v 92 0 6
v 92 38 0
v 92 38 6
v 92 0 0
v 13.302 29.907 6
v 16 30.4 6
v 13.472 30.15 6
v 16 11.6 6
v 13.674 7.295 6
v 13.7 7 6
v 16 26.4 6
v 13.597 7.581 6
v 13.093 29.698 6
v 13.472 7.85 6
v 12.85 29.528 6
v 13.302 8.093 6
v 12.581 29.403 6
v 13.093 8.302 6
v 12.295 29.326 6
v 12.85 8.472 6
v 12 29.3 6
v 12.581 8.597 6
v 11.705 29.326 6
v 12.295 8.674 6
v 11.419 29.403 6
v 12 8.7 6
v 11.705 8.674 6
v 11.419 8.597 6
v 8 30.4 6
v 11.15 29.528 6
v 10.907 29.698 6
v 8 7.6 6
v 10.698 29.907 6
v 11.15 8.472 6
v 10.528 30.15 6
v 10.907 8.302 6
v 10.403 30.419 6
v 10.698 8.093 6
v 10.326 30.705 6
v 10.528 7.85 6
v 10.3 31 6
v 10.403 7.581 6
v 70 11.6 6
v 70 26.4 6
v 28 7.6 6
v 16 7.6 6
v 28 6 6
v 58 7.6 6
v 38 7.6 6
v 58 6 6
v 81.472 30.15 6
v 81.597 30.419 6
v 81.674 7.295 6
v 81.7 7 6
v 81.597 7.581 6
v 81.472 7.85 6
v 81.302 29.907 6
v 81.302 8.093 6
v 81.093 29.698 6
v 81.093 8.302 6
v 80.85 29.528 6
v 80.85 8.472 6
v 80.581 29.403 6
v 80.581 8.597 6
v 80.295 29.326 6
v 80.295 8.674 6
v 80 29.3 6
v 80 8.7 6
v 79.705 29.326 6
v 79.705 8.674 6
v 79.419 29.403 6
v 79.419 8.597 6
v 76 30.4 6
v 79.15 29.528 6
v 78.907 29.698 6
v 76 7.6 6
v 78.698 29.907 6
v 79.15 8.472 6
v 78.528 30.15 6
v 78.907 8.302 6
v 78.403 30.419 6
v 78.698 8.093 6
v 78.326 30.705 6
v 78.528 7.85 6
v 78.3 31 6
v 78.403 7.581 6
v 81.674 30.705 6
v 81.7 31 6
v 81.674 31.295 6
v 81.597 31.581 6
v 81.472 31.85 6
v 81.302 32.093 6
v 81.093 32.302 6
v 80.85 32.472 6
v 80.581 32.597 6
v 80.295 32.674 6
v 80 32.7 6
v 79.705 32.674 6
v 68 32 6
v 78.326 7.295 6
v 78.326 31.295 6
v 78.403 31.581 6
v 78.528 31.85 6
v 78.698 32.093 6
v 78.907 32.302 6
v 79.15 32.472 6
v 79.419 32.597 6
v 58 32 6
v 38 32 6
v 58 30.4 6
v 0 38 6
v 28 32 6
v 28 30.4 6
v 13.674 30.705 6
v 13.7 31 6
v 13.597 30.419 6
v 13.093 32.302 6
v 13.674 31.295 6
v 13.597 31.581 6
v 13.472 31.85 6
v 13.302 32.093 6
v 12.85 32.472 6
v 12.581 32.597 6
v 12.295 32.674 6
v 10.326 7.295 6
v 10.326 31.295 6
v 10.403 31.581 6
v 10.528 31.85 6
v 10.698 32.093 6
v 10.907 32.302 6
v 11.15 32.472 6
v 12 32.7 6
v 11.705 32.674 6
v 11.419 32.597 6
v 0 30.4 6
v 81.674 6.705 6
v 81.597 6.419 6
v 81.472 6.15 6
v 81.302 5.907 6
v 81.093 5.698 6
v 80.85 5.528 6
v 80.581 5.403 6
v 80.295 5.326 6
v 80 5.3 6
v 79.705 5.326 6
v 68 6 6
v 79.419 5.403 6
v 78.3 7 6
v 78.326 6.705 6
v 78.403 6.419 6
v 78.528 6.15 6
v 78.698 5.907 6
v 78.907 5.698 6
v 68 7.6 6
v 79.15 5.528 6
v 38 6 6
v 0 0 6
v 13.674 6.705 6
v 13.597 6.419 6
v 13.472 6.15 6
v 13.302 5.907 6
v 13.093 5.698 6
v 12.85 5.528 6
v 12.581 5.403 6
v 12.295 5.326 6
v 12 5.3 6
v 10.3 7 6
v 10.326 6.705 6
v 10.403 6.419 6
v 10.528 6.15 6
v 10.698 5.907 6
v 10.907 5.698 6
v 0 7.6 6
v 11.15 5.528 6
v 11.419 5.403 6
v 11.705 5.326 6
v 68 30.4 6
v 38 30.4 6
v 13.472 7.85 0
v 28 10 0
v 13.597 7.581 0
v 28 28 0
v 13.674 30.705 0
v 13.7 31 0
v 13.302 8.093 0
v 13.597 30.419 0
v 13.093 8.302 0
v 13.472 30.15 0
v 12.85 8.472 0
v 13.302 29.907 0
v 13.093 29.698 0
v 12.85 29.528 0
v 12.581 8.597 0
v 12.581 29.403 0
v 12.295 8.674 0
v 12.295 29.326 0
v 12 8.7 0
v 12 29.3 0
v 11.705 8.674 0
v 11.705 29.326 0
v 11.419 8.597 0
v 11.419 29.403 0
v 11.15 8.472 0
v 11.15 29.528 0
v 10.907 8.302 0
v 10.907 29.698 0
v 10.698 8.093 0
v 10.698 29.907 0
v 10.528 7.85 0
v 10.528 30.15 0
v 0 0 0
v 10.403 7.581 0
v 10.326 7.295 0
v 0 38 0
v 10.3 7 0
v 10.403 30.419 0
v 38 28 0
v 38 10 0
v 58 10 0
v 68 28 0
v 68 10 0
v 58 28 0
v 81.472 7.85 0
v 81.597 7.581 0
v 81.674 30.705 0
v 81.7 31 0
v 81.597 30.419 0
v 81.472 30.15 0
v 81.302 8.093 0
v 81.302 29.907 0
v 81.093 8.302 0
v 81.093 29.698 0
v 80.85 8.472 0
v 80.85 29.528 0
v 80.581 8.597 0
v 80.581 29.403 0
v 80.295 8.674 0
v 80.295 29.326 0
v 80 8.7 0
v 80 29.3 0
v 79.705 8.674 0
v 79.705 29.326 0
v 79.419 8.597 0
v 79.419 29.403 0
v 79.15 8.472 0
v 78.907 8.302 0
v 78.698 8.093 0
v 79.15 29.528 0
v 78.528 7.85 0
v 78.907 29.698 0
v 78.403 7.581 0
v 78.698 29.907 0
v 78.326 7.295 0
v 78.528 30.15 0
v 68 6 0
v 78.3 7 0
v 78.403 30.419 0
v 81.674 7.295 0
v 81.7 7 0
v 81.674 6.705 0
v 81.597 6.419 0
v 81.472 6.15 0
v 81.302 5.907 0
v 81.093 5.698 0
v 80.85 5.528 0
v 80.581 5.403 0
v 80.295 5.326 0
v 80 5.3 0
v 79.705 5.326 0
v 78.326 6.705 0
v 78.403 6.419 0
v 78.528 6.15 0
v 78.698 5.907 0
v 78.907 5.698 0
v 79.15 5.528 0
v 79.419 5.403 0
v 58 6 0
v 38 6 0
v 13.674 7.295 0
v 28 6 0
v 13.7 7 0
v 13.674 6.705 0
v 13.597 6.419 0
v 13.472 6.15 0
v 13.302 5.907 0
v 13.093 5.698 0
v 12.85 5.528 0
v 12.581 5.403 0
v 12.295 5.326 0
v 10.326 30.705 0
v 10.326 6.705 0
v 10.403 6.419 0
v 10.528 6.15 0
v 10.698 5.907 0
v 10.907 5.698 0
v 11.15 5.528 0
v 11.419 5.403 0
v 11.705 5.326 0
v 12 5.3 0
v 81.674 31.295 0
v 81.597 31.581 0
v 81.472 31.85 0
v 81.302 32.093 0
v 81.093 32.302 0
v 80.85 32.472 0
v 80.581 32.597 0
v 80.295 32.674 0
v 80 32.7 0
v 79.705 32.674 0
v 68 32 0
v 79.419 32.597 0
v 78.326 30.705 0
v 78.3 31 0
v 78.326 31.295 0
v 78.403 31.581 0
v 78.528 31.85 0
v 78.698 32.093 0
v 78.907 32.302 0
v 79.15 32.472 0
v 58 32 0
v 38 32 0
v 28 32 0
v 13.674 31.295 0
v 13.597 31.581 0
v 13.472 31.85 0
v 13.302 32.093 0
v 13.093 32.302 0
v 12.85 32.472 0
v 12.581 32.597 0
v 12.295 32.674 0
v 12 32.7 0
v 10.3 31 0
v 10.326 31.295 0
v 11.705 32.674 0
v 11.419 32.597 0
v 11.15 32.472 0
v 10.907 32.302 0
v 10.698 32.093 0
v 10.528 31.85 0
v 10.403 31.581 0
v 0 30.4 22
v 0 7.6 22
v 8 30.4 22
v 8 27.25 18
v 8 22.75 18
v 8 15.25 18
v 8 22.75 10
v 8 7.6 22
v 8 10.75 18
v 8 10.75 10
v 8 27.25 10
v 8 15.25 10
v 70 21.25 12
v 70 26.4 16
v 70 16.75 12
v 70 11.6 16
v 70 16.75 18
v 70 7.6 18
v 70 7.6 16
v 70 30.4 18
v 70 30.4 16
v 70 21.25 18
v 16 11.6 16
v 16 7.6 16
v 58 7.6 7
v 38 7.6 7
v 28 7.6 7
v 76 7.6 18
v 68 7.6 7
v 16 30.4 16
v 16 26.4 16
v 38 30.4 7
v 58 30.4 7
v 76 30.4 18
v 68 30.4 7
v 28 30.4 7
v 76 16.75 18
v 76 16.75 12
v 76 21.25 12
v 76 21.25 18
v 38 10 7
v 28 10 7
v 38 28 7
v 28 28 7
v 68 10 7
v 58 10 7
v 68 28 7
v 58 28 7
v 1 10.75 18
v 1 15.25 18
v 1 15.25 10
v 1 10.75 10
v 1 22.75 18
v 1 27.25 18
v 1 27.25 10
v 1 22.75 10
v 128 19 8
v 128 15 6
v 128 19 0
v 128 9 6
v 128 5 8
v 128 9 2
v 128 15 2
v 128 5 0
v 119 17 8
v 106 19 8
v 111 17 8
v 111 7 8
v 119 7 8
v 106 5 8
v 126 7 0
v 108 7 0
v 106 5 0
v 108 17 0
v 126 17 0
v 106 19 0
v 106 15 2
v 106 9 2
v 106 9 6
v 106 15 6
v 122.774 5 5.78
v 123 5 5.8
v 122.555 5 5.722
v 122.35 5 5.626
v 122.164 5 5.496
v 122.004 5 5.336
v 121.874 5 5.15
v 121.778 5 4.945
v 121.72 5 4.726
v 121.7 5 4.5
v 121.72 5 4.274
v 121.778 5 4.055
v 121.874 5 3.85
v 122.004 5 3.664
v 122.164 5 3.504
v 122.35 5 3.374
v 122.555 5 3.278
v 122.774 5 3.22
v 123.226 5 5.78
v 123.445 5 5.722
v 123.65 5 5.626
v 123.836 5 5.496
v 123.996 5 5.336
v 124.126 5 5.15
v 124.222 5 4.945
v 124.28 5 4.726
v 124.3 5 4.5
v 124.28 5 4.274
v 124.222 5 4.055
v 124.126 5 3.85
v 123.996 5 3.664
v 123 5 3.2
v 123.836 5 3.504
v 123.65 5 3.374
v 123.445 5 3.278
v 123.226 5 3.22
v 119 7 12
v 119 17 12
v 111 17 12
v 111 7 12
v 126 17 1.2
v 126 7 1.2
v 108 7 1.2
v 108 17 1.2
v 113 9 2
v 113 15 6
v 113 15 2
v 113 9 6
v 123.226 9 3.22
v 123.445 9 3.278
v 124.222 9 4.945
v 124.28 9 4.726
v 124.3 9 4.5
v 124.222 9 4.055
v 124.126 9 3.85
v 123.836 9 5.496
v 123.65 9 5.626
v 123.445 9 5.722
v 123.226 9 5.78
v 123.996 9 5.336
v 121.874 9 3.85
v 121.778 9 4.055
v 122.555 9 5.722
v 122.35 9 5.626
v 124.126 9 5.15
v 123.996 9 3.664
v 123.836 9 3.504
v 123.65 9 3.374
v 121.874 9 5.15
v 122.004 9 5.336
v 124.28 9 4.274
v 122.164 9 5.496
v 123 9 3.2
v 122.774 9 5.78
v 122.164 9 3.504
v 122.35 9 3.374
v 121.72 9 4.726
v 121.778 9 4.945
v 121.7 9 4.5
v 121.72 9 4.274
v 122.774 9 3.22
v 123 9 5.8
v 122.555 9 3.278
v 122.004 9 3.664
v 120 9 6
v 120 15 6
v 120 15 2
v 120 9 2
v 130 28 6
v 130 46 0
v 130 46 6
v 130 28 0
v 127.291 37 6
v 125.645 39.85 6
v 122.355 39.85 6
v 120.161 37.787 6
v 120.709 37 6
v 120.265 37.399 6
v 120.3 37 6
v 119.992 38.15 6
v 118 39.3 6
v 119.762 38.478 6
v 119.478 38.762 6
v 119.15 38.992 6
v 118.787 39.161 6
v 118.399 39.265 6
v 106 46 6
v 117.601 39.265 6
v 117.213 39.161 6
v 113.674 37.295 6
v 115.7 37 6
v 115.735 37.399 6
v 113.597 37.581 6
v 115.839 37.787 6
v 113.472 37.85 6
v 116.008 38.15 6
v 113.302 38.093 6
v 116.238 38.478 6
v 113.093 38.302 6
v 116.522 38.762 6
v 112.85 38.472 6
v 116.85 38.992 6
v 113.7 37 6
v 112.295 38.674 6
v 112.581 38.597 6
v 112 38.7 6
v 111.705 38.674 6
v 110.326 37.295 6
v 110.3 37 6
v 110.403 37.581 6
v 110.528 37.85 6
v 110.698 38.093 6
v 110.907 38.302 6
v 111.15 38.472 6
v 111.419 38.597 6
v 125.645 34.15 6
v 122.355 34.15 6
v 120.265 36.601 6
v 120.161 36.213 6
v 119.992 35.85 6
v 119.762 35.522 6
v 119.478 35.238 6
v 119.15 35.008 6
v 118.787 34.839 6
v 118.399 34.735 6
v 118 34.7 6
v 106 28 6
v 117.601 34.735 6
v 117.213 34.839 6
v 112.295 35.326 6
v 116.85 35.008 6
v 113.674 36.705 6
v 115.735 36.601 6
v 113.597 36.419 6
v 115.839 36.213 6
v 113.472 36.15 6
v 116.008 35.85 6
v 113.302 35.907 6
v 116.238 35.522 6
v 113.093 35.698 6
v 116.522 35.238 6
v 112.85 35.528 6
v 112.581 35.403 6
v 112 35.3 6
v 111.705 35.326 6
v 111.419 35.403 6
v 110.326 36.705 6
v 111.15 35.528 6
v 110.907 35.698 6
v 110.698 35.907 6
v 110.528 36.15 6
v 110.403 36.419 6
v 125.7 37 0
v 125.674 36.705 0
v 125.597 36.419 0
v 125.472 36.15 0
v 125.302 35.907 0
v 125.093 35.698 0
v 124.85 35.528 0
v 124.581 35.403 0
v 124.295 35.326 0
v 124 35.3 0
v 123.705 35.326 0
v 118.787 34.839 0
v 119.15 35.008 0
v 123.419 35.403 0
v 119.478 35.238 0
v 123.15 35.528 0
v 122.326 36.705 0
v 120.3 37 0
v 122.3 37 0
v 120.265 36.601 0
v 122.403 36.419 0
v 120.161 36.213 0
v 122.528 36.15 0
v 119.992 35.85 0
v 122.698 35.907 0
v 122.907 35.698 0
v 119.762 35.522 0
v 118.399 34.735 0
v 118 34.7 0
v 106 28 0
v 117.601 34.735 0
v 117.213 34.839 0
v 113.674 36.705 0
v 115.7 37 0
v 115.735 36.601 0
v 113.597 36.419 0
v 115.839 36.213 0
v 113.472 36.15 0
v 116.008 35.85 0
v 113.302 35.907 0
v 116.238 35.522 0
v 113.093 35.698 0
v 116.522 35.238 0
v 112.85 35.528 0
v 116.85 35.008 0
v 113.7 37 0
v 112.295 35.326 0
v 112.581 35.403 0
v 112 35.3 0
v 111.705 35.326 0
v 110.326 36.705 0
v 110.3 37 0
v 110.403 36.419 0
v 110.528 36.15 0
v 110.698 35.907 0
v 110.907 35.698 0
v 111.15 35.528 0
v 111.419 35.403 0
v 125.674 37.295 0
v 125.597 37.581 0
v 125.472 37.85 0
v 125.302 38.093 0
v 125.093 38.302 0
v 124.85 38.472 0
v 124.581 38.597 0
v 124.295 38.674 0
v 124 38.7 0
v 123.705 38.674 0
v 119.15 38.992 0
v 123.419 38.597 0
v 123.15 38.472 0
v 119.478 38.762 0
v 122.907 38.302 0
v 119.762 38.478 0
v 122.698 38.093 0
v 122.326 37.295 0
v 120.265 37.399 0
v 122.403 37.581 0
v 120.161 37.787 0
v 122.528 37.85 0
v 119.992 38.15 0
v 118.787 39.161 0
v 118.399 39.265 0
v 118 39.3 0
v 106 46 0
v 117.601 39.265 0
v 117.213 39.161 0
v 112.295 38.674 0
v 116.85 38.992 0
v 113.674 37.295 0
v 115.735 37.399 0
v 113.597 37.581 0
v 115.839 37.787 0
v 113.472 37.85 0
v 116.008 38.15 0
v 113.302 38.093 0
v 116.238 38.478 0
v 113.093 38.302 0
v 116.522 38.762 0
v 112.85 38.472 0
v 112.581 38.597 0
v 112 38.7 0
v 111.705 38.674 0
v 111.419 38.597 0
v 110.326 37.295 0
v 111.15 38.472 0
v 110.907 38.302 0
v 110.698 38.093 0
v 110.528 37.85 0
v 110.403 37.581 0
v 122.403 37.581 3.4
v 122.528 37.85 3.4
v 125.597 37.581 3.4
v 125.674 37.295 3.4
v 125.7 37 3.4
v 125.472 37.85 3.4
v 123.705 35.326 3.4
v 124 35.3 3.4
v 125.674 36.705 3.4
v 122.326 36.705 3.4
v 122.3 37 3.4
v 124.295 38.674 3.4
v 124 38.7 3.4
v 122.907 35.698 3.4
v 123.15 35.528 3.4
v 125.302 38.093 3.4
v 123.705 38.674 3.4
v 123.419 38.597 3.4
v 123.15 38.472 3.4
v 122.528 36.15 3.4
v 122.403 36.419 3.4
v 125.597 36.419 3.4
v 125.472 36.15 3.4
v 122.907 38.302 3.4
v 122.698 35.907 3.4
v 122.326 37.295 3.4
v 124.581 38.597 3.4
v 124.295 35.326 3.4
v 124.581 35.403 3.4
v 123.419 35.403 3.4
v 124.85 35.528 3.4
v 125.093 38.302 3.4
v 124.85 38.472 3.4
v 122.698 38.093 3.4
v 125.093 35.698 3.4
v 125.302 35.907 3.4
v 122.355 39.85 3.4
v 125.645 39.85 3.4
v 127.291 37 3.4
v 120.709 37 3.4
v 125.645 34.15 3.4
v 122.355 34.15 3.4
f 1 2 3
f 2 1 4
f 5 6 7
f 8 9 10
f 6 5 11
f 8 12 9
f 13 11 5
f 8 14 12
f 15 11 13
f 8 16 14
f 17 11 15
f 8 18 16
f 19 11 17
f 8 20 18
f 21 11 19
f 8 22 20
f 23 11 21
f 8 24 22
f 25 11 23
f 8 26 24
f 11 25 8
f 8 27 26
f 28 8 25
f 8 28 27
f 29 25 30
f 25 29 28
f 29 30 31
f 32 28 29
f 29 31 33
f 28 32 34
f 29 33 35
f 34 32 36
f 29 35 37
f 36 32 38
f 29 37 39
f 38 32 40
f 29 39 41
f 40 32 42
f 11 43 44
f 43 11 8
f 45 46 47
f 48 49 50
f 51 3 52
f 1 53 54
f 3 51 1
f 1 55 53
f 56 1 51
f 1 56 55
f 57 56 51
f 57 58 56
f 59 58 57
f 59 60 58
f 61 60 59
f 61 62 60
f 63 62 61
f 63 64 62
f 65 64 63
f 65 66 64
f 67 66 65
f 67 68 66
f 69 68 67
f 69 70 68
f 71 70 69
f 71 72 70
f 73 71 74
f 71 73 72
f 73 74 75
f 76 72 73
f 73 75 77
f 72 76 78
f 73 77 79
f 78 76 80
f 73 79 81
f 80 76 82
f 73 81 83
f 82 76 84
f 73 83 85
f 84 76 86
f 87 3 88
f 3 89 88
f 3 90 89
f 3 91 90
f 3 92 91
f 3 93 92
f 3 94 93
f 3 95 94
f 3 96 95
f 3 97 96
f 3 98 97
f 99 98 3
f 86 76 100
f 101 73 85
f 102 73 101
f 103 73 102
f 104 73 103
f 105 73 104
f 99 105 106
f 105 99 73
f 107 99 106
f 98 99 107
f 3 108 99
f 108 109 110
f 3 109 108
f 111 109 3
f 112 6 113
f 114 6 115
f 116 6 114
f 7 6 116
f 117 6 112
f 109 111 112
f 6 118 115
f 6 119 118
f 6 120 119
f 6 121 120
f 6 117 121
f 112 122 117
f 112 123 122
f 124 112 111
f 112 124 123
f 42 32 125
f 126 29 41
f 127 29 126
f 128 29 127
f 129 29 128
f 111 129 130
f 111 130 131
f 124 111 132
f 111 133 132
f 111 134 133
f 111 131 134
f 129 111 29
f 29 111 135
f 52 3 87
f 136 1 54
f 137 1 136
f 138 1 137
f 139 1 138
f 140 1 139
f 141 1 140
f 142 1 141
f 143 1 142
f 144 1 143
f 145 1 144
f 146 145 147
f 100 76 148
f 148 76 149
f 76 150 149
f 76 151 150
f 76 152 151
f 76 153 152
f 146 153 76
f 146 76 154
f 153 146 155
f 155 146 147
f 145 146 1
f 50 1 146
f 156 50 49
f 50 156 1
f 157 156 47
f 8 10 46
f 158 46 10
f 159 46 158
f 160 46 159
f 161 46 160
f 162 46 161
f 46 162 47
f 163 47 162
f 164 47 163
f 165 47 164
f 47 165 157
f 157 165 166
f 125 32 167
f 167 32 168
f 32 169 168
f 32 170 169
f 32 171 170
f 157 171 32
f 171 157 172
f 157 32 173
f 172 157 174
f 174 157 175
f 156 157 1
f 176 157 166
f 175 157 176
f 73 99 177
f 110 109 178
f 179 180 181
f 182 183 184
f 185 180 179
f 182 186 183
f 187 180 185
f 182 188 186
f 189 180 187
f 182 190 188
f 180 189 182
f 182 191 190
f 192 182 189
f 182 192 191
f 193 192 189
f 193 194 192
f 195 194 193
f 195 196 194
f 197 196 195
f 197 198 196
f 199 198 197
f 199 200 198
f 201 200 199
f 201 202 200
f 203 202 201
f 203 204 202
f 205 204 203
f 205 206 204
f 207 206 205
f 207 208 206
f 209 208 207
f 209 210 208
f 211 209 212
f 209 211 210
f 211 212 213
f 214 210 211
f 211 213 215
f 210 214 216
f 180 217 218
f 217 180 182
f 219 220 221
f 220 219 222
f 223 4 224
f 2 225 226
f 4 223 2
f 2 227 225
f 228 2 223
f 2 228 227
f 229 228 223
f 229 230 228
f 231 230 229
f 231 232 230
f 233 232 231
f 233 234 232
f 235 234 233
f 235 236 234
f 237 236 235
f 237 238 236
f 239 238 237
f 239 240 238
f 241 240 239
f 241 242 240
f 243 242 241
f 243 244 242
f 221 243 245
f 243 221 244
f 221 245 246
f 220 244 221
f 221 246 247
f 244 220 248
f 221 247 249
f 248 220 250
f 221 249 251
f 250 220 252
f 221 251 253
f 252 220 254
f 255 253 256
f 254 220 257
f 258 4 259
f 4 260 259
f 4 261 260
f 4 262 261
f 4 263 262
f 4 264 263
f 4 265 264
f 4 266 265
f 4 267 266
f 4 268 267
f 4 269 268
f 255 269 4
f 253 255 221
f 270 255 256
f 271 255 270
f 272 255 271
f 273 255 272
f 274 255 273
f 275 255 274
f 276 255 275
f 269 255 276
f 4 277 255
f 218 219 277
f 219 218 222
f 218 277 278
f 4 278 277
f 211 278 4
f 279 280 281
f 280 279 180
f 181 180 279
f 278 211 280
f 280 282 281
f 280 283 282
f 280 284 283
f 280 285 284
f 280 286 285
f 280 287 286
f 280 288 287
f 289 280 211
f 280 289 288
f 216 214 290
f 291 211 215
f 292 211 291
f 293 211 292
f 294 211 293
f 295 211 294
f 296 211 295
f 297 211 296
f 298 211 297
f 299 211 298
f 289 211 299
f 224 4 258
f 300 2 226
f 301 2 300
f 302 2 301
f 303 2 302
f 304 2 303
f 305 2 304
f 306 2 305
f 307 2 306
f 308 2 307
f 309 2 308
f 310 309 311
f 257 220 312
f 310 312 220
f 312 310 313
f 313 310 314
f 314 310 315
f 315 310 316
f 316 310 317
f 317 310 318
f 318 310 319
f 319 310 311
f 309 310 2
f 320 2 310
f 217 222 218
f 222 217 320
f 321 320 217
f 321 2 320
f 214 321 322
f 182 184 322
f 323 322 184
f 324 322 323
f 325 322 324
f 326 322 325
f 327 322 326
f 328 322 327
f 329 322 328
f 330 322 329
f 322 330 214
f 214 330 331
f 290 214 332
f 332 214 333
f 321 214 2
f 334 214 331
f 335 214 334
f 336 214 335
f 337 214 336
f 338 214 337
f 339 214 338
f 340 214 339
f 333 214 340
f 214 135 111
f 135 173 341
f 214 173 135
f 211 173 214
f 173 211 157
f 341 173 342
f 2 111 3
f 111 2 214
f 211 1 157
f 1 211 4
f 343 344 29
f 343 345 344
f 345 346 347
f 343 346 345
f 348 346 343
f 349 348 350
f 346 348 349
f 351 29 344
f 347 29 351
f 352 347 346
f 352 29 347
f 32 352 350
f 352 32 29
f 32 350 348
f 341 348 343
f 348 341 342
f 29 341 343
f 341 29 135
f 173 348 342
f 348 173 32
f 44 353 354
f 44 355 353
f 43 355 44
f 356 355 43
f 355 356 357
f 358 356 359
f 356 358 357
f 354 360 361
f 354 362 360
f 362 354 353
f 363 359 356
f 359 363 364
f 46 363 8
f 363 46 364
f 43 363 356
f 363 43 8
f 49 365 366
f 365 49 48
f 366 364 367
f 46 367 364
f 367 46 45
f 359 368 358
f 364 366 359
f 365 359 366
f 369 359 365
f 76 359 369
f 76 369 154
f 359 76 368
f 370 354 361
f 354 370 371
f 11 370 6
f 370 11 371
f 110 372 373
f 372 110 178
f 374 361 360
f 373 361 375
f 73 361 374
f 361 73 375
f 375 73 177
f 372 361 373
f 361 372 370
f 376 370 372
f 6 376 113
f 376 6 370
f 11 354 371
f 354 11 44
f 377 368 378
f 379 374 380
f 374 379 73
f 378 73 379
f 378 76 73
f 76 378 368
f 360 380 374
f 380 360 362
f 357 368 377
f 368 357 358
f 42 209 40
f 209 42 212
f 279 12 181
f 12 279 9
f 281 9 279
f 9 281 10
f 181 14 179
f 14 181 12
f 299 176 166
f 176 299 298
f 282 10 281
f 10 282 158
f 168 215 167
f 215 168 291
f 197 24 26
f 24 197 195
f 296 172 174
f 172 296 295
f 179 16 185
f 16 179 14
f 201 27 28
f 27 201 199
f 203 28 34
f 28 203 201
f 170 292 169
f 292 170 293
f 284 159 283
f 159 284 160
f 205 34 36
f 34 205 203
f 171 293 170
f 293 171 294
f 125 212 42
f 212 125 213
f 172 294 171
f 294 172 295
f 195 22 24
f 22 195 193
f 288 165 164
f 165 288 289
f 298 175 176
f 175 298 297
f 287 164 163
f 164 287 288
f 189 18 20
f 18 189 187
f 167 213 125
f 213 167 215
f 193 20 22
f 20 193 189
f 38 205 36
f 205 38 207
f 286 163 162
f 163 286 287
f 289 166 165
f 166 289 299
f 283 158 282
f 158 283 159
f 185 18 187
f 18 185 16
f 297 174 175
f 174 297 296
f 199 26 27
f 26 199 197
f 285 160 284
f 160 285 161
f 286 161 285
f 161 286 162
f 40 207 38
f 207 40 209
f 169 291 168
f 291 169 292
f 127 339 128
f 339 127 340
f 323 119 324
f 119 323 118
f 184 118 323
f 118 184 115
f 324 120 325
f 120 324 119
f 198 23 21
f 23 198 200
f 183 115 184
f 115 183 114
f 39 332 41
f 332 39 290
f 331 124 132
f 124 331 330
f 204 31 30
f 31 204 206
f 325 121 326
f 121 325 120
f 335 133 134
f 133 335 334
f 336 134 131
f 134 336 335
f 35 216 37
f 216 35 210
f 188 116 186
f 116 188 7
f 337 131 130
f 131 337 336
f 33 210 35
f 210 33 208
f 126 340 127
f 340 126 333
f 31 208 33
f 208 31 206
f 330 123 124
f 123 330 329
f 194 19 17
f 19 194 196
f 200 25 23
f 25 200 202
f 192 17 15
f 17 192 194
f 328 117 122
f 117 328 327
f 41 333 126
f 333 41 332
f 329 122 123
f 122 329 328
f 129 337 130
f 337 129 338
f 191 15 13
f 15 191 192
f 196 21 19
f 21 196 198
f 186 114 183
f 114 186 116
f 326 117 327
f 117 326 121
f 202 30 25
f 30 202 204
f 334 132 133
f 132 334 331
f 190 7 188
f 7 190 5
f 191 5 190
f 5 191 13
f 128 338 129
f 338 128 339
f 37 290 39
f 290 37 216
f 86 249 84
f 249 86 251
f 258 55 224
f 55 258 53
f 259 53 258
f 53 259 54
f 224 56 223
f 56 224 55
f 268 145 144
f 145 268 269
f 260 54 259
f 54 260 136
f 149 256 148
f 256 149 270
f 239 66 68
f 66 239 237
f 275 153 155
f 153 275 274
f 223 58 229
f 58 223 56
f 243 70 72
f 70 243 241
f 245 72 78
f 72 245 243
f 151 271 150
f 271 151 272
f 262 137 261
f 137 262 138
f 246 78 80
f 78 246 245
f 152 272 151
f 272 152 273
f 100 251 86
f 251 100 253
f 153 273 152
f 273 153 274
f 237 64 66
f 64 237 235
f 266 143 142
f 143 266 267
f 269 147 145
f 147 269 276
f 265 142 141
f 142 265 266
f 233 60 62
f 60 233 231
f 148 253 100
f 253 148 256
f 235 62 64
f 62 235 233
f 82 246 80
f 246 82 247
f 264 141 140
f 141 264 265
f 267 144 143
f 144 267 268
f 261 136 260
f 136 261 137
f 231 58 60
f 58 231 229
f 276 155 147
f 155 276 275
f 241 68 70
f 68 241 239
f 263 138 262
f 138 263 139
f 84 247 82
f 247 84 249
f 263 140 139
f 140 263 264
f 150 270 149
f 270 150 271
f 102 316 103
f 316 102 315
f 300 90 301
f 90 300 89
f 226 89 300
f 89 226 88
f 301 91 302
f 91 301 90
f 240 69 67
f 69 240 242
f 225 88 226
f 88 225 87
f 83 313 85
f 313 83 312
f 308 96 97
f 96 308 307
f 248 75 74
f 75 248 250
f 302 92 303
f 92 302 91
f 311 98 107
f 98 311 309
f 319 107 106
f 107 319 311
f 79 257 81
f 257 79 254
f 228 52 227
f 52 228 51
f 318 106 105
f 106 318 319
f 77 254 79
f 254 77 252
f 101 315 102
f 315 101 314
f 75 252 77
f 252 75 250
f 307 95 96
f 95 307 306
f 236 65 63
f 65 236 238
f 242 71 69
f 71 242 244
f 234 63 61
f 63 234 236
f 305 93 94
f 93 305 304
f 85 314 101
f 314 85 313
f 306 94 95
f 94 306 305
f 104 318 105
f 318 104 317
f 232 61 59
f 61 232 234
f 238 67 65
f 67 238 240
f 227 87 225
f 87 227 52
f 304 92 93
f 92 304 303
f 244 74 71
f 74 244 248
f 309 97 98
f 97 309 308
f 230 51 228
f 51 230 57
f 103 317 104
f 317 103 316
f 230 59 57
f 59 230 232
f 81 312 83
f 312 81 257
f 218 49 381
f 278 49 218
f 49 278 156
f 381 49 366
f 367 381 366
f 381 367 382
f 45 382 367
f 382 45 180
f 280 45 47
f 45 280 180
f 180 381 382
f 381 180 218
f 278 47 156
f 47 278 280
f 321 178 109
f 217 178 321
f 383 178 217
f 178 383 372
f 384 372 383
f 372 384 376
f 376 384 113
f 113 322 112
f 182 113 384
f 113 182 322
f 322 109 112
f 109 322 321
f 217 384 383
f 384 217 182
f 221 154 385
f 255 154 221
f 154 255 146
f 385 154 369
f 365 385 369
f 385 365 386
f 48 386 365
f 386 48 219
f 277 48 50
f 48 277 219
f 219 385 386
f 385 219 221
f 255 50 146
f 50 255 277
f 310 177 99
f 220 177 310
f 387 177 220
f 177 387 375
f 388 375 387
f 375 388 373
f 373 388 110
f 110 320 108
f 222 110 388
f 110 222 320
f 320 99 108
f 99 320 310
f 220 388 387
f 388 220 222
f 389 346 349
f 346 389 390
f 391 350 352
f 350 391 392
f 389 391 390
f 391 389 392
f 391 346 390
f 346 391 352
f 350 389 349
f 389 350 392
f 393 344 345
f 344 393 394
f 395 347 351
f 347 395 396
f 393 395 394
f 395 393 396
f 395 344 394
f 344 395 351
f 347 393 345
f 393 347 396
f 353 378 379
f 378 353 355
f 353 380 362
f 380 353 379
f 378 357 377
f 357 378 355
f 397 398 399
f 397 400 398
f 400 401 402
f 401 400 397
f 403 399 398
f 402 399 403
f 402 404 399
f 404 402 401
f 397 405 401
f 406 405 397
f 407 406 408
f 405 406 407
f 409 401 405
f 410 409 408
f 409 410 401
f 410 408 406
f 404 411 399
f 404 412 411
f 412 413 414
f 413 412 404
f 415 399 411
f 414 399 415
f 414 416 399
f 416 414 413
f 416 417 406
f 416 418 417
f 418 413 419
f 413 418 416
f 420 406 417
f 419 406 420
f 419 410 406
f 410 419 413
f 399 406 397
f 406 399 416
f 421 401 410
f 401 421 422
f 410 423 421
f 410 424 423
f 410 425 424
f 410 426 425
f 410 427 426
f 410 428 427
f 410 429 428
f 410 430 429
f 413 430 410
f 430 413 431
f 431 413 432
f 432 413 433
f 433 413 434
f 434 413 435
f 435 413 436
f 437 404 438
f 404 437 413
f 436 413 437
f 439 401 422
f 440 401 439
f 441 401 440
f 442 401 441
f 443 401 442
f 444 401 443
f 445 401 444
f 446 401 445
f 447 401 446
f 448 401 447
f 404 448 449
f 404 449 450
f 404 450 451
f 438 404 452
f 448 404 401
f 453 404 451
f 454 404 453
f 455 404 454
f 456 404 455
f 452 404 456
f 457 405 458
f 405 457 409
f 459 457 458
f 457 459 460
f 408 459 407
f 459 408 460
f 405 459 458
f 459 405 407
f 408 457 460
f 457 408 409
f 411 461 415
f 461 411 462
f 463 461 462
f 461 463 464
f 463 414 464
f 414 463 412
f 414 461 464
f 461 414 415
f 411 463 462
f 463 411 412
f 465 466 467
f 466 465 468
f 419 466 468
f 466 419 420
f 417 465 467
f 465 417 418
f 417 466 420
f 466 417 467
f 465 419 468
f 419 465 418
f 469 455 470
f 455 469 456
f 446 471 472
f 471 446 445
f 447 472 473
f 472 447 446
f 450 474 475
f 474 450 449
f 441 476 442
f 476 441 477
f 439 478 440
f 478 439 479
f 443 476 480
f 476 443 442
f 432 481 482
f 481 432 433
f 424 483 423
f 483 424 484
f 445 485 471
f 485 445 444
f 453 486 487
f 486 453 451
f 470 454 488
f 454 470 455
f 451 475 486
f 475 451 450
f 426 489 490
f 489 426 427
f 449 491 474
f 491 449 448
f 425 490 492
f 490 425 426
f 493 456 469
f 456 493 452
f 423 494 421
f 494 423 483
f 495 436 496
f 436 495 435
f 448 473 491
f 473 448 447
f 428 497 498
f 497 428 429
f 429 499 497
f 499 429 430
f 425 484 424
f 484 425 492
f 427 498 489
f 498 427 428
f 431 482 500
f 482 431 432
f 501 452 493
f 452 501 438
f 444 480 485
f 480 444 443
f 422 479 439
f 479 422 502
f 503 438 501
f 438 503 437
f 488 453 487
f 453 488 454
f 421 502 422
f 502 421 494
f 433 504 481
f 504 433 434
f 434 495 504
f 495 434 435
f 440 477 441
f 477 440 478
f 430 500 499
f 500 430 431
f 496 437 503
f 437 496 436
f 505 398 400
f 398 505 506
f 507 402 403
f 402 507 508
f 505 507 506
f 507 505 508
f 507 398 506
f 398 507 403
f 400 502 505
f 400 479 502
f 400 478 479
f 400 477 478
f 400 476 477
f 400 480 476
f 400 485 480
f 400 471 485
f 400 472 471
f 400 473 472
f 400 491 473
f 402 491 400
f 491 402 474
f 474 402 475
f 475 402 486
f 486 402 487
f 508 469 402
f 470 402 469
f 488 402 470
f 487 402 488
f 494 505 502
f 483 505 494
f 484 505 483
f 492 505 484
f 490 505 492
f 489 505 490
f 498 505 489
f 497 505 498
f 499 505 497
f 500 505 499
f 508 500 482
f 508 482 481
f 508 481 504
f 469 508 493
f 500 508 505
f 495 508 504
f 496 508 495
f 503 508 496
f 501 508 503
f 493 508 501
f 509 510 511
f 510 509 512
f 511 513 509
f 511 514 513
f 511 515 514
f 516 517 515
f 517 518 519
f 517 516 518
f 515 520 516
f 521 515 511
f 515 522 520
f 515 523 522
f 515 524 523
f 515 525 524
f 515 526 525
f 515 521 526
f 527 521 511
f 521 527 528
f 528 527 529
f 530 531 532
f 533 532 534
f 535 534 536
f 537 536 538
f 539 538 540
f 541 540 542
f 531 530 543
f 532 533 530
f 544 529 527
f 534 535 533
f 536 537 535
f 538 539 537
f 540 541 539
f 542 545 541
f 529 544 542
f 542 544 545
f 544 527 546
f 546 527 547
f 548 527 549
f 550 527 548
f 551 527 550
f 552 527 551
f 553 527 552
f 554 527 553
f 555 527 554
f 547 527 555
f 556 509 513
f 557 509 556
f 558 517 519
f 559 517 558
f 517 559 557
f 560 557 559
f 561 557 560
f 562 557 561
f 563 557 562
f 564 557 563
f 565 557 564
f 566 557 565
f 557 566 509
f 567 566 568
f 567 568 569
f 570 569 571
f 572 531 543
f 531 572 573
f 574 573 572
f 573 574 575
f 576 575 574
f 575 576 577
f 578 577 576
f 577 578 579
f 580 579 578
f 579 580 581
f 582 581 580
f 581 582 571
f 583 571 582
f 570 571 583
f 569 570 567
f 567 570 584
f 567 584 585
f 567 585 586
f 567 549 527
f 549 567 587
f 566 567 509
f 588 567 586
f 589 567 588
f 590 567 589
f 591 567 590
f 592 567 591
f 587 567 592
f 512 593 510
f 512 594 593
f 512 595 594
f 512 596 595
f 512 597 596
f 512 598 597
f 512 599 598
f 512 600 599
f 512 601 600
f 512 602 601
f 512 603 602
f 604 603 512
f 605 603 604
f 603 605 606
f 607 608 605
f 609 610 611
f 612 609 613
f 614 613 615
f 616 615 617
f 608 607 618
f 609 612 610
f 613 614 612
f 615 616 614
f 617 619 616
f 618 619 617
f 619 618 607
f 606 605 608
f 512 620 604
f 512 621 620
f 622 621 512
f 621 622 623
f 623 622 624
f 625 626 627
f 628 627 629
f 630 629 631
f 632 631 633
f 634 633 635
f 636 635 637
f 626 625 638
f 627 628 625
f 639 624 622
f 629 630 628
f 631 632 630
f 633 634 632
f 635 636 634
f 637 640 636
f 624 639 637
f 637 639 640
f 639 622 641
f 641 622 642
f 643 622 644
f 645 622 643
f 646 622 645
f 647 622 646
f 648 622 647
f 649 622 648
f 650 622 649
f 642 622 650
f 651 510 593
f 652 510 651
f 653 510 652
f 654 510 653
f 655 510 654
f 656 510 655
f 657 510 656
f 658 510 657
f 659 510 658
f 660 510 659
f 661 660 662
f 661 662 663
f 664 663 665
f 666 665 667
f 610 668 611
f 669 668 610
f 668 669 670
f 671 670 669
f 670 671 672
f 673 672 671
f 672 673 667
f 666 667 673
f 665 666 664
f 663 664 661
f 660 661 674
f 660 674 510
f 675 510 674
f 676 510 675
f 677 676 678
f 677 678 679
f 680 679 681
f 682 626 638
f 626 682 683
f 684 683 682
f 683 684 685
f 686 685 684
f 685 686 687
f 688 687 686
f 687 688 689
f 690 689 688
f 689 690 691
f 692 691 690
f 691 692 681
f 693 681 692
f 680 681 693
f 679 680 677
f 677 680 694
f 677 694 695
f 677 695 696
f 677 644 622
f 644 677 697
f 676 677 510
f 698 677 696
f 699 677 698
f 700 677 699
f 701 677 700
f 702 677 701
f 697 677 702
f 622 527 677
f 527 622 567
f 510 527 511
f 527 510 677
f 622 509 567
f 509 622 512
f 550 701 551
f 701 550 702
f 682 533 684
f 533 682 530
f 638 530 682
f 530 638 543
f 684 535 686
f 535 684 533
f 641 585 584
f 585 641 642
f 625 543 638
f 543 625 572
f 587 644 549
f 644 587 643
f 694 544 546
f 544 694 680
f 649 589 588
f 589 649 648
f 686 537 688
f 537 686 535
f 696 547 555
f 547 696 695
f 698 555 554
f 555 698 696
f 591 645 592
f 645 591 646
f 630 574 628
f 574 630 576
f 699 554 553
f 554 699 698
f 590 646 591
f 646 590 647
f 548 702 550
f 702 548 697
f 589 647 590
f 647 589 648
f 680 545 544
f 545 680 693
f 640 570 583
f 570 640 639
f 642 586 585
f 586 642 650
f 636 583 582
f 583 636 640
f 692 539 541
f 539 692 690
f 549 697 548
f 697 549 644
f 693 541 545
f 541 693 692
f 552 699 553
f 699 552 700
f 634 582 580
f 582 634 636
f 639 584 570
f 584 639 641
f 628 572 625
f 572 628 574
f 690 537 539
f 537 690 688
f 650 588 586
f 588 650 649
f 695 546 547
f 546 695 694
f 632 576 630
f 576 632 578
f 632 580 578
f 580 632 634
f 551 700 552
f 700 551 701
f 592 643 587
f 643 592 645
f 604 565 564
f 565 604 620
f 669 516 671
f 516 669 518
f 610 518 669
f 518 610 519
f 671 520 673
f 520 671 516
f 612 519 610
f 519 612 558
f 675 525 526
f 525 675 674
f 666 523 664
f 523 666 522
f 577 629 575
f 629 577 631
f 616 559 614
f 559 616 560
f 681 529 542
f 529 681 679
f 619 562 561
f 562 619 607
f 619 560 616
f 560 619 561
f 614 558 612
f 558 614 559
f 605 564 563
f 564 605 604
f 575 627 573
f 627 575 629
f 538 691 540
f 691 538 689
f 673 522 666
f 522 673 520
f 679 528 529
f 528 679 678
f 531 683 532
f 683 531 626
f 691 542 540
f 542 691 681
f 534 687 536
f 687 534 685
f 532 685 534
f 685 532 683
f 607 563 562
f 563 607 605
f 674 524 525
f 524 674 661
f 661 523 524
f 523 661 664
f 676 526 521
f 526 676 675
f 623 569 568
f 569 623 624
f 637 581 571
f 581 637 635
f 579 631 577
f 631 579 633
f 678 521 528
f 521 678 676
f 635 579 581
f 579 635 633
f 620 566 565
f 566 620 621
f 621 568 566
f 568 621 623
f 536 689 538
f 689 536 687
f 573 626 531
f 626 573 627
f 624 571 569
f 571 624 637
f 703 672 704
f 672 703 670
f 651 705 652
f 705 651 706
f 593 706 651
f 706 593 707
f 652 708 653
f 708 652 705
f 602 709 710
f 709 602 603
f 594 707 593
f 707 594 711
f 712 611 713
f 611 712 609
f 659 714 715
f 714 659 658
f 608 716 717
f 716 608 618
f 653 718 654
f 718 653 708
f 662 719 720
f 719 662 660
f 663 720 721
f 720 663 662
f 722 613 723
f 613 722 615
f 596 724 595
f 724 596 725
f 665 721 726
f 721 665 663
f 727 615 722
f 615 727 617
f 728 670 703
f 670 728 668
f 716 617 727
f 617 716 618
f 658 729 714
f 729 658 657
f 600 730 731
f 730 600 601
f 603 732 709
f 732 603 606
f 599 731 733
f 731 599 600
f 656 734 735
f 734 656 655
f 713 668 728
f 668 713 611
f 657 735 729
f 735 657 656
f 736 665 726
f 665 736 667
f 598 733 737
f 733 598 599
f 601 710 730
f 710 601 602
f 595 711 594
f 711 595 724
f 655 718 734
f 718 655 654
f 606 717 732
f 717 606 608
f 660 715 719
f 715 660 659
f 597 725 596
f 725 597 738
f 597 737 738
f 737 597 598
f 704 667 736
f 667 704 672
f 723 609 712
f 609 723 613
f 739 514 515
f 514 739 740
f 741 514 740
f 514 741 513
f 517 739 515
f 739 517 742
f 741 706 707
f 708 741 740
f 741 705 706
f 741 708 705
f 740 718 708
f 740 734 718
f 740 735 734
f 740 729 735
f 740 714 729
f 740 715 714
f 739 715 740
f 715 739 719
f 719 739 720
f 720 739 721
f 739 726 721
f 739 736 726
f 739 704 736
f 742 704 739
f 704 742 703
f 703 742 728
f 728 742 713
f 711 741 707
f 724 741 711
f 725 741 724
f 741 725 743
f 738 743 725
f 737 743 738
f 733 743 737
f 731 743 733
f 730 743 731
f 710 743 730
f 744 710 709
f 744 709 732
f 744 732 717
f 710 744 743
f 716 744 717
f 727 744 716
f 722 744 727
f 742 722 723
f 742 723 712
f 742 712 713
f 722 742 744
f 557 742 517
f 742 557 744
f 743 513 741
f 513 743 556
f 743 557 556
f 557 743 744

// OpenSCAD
/*
Render-only scene file for bench_mechanism_v3.

This does not change the printable geometry.
It exists to make the preview package easier to inspect from multiple angles.

Scenes:
- scene = 1 -> base only
- scene = 2 -> carriage only
- scene = 3 -> M3 test block only
- scene = 4 -> all parts laid out together
- scene = 5 -> assembled preview
- scene = 6 -> assembled top view with scale card
*/

use <bench_mechanism_v3.scad>

scene = 4;

// Duplicated from bench_mechanism_v3.scad for render-only placement math.
rail_start = 16;
rail_length = 54;
base_width = 38;
carriage_width = 14;
base_thickness = 6;
vertical_clearance = 0.35;
front_stop_length = 6;
front_stop_height = 12;

// Cosmetic-only colors for clearer previews.
base_color = [0.68, 0.08, 0.10];
carriage_color = [0.78, 0.80, 0.84];
test_color = [0.42, 0.46, 0.50];
accent_color = [0.95, 0.82, 0.16];

module scale_card(size = [110, 70, 1.2], tick = 10) {
    color([0.96, 0.96, 0.98, 0.35])
        cube(size);

    color([0.55, 0.55, 0.60, 0.65]) {
        for (x = [0 : tick : size[0]]) {
            translate([x, 0, size[2]])
                cube([0.35, size[1], 0.25]);
        }

        for (y = [0 : tick : size[1]]) {
            translate([0, y, size[2]])
                cube([size[0], 0.35, 0.25]);
        }
    }
}

module base_pretty() {
    color(base_color) base_module();
}

module carriage_pretty() {
    color(carriage_color) carriage_module();
}

module test_block_pretty() {
    color(test_color) m3_test_block();
}

module all_parts_layout() {
    base_pretty();
    translate([106, 5, 0]) carriage_pretty();
    translate([106, 28, 0]) test_block_pretty();
}

module assembled_pretty() {
    base_pretty();
    translate([rail_start + 8, (base_width - carriage_width) / 2, base_thickness + vertical_clearance])
        carriage_pretty();

    // Cosmetic string line for preview only.
    color(accent_color)
        translate([rail_start + rail_length + front_stop_length - 1, base_width / 2 - 0.6, base_thickness + front_stop_height - 4])
            cube([18, 1.2, 1.2]);
}

module assembled_top_with_scale() {
    translate([-9, -16, -1.2]) scale_card();
    assembled_pretty();
}

if (scene == 1) {
    base_pretty();
} else if (scene == 2) {
    carriage_pretty();
} else if (scene == 3) {
    test_block_pretty();
} else if (scene == 4) {
    all_parts_layout();
} else if (scene == 5) {
    assembled_pretty();
} else if (scene == 6) {
    assembled_top_with_scale();
}
